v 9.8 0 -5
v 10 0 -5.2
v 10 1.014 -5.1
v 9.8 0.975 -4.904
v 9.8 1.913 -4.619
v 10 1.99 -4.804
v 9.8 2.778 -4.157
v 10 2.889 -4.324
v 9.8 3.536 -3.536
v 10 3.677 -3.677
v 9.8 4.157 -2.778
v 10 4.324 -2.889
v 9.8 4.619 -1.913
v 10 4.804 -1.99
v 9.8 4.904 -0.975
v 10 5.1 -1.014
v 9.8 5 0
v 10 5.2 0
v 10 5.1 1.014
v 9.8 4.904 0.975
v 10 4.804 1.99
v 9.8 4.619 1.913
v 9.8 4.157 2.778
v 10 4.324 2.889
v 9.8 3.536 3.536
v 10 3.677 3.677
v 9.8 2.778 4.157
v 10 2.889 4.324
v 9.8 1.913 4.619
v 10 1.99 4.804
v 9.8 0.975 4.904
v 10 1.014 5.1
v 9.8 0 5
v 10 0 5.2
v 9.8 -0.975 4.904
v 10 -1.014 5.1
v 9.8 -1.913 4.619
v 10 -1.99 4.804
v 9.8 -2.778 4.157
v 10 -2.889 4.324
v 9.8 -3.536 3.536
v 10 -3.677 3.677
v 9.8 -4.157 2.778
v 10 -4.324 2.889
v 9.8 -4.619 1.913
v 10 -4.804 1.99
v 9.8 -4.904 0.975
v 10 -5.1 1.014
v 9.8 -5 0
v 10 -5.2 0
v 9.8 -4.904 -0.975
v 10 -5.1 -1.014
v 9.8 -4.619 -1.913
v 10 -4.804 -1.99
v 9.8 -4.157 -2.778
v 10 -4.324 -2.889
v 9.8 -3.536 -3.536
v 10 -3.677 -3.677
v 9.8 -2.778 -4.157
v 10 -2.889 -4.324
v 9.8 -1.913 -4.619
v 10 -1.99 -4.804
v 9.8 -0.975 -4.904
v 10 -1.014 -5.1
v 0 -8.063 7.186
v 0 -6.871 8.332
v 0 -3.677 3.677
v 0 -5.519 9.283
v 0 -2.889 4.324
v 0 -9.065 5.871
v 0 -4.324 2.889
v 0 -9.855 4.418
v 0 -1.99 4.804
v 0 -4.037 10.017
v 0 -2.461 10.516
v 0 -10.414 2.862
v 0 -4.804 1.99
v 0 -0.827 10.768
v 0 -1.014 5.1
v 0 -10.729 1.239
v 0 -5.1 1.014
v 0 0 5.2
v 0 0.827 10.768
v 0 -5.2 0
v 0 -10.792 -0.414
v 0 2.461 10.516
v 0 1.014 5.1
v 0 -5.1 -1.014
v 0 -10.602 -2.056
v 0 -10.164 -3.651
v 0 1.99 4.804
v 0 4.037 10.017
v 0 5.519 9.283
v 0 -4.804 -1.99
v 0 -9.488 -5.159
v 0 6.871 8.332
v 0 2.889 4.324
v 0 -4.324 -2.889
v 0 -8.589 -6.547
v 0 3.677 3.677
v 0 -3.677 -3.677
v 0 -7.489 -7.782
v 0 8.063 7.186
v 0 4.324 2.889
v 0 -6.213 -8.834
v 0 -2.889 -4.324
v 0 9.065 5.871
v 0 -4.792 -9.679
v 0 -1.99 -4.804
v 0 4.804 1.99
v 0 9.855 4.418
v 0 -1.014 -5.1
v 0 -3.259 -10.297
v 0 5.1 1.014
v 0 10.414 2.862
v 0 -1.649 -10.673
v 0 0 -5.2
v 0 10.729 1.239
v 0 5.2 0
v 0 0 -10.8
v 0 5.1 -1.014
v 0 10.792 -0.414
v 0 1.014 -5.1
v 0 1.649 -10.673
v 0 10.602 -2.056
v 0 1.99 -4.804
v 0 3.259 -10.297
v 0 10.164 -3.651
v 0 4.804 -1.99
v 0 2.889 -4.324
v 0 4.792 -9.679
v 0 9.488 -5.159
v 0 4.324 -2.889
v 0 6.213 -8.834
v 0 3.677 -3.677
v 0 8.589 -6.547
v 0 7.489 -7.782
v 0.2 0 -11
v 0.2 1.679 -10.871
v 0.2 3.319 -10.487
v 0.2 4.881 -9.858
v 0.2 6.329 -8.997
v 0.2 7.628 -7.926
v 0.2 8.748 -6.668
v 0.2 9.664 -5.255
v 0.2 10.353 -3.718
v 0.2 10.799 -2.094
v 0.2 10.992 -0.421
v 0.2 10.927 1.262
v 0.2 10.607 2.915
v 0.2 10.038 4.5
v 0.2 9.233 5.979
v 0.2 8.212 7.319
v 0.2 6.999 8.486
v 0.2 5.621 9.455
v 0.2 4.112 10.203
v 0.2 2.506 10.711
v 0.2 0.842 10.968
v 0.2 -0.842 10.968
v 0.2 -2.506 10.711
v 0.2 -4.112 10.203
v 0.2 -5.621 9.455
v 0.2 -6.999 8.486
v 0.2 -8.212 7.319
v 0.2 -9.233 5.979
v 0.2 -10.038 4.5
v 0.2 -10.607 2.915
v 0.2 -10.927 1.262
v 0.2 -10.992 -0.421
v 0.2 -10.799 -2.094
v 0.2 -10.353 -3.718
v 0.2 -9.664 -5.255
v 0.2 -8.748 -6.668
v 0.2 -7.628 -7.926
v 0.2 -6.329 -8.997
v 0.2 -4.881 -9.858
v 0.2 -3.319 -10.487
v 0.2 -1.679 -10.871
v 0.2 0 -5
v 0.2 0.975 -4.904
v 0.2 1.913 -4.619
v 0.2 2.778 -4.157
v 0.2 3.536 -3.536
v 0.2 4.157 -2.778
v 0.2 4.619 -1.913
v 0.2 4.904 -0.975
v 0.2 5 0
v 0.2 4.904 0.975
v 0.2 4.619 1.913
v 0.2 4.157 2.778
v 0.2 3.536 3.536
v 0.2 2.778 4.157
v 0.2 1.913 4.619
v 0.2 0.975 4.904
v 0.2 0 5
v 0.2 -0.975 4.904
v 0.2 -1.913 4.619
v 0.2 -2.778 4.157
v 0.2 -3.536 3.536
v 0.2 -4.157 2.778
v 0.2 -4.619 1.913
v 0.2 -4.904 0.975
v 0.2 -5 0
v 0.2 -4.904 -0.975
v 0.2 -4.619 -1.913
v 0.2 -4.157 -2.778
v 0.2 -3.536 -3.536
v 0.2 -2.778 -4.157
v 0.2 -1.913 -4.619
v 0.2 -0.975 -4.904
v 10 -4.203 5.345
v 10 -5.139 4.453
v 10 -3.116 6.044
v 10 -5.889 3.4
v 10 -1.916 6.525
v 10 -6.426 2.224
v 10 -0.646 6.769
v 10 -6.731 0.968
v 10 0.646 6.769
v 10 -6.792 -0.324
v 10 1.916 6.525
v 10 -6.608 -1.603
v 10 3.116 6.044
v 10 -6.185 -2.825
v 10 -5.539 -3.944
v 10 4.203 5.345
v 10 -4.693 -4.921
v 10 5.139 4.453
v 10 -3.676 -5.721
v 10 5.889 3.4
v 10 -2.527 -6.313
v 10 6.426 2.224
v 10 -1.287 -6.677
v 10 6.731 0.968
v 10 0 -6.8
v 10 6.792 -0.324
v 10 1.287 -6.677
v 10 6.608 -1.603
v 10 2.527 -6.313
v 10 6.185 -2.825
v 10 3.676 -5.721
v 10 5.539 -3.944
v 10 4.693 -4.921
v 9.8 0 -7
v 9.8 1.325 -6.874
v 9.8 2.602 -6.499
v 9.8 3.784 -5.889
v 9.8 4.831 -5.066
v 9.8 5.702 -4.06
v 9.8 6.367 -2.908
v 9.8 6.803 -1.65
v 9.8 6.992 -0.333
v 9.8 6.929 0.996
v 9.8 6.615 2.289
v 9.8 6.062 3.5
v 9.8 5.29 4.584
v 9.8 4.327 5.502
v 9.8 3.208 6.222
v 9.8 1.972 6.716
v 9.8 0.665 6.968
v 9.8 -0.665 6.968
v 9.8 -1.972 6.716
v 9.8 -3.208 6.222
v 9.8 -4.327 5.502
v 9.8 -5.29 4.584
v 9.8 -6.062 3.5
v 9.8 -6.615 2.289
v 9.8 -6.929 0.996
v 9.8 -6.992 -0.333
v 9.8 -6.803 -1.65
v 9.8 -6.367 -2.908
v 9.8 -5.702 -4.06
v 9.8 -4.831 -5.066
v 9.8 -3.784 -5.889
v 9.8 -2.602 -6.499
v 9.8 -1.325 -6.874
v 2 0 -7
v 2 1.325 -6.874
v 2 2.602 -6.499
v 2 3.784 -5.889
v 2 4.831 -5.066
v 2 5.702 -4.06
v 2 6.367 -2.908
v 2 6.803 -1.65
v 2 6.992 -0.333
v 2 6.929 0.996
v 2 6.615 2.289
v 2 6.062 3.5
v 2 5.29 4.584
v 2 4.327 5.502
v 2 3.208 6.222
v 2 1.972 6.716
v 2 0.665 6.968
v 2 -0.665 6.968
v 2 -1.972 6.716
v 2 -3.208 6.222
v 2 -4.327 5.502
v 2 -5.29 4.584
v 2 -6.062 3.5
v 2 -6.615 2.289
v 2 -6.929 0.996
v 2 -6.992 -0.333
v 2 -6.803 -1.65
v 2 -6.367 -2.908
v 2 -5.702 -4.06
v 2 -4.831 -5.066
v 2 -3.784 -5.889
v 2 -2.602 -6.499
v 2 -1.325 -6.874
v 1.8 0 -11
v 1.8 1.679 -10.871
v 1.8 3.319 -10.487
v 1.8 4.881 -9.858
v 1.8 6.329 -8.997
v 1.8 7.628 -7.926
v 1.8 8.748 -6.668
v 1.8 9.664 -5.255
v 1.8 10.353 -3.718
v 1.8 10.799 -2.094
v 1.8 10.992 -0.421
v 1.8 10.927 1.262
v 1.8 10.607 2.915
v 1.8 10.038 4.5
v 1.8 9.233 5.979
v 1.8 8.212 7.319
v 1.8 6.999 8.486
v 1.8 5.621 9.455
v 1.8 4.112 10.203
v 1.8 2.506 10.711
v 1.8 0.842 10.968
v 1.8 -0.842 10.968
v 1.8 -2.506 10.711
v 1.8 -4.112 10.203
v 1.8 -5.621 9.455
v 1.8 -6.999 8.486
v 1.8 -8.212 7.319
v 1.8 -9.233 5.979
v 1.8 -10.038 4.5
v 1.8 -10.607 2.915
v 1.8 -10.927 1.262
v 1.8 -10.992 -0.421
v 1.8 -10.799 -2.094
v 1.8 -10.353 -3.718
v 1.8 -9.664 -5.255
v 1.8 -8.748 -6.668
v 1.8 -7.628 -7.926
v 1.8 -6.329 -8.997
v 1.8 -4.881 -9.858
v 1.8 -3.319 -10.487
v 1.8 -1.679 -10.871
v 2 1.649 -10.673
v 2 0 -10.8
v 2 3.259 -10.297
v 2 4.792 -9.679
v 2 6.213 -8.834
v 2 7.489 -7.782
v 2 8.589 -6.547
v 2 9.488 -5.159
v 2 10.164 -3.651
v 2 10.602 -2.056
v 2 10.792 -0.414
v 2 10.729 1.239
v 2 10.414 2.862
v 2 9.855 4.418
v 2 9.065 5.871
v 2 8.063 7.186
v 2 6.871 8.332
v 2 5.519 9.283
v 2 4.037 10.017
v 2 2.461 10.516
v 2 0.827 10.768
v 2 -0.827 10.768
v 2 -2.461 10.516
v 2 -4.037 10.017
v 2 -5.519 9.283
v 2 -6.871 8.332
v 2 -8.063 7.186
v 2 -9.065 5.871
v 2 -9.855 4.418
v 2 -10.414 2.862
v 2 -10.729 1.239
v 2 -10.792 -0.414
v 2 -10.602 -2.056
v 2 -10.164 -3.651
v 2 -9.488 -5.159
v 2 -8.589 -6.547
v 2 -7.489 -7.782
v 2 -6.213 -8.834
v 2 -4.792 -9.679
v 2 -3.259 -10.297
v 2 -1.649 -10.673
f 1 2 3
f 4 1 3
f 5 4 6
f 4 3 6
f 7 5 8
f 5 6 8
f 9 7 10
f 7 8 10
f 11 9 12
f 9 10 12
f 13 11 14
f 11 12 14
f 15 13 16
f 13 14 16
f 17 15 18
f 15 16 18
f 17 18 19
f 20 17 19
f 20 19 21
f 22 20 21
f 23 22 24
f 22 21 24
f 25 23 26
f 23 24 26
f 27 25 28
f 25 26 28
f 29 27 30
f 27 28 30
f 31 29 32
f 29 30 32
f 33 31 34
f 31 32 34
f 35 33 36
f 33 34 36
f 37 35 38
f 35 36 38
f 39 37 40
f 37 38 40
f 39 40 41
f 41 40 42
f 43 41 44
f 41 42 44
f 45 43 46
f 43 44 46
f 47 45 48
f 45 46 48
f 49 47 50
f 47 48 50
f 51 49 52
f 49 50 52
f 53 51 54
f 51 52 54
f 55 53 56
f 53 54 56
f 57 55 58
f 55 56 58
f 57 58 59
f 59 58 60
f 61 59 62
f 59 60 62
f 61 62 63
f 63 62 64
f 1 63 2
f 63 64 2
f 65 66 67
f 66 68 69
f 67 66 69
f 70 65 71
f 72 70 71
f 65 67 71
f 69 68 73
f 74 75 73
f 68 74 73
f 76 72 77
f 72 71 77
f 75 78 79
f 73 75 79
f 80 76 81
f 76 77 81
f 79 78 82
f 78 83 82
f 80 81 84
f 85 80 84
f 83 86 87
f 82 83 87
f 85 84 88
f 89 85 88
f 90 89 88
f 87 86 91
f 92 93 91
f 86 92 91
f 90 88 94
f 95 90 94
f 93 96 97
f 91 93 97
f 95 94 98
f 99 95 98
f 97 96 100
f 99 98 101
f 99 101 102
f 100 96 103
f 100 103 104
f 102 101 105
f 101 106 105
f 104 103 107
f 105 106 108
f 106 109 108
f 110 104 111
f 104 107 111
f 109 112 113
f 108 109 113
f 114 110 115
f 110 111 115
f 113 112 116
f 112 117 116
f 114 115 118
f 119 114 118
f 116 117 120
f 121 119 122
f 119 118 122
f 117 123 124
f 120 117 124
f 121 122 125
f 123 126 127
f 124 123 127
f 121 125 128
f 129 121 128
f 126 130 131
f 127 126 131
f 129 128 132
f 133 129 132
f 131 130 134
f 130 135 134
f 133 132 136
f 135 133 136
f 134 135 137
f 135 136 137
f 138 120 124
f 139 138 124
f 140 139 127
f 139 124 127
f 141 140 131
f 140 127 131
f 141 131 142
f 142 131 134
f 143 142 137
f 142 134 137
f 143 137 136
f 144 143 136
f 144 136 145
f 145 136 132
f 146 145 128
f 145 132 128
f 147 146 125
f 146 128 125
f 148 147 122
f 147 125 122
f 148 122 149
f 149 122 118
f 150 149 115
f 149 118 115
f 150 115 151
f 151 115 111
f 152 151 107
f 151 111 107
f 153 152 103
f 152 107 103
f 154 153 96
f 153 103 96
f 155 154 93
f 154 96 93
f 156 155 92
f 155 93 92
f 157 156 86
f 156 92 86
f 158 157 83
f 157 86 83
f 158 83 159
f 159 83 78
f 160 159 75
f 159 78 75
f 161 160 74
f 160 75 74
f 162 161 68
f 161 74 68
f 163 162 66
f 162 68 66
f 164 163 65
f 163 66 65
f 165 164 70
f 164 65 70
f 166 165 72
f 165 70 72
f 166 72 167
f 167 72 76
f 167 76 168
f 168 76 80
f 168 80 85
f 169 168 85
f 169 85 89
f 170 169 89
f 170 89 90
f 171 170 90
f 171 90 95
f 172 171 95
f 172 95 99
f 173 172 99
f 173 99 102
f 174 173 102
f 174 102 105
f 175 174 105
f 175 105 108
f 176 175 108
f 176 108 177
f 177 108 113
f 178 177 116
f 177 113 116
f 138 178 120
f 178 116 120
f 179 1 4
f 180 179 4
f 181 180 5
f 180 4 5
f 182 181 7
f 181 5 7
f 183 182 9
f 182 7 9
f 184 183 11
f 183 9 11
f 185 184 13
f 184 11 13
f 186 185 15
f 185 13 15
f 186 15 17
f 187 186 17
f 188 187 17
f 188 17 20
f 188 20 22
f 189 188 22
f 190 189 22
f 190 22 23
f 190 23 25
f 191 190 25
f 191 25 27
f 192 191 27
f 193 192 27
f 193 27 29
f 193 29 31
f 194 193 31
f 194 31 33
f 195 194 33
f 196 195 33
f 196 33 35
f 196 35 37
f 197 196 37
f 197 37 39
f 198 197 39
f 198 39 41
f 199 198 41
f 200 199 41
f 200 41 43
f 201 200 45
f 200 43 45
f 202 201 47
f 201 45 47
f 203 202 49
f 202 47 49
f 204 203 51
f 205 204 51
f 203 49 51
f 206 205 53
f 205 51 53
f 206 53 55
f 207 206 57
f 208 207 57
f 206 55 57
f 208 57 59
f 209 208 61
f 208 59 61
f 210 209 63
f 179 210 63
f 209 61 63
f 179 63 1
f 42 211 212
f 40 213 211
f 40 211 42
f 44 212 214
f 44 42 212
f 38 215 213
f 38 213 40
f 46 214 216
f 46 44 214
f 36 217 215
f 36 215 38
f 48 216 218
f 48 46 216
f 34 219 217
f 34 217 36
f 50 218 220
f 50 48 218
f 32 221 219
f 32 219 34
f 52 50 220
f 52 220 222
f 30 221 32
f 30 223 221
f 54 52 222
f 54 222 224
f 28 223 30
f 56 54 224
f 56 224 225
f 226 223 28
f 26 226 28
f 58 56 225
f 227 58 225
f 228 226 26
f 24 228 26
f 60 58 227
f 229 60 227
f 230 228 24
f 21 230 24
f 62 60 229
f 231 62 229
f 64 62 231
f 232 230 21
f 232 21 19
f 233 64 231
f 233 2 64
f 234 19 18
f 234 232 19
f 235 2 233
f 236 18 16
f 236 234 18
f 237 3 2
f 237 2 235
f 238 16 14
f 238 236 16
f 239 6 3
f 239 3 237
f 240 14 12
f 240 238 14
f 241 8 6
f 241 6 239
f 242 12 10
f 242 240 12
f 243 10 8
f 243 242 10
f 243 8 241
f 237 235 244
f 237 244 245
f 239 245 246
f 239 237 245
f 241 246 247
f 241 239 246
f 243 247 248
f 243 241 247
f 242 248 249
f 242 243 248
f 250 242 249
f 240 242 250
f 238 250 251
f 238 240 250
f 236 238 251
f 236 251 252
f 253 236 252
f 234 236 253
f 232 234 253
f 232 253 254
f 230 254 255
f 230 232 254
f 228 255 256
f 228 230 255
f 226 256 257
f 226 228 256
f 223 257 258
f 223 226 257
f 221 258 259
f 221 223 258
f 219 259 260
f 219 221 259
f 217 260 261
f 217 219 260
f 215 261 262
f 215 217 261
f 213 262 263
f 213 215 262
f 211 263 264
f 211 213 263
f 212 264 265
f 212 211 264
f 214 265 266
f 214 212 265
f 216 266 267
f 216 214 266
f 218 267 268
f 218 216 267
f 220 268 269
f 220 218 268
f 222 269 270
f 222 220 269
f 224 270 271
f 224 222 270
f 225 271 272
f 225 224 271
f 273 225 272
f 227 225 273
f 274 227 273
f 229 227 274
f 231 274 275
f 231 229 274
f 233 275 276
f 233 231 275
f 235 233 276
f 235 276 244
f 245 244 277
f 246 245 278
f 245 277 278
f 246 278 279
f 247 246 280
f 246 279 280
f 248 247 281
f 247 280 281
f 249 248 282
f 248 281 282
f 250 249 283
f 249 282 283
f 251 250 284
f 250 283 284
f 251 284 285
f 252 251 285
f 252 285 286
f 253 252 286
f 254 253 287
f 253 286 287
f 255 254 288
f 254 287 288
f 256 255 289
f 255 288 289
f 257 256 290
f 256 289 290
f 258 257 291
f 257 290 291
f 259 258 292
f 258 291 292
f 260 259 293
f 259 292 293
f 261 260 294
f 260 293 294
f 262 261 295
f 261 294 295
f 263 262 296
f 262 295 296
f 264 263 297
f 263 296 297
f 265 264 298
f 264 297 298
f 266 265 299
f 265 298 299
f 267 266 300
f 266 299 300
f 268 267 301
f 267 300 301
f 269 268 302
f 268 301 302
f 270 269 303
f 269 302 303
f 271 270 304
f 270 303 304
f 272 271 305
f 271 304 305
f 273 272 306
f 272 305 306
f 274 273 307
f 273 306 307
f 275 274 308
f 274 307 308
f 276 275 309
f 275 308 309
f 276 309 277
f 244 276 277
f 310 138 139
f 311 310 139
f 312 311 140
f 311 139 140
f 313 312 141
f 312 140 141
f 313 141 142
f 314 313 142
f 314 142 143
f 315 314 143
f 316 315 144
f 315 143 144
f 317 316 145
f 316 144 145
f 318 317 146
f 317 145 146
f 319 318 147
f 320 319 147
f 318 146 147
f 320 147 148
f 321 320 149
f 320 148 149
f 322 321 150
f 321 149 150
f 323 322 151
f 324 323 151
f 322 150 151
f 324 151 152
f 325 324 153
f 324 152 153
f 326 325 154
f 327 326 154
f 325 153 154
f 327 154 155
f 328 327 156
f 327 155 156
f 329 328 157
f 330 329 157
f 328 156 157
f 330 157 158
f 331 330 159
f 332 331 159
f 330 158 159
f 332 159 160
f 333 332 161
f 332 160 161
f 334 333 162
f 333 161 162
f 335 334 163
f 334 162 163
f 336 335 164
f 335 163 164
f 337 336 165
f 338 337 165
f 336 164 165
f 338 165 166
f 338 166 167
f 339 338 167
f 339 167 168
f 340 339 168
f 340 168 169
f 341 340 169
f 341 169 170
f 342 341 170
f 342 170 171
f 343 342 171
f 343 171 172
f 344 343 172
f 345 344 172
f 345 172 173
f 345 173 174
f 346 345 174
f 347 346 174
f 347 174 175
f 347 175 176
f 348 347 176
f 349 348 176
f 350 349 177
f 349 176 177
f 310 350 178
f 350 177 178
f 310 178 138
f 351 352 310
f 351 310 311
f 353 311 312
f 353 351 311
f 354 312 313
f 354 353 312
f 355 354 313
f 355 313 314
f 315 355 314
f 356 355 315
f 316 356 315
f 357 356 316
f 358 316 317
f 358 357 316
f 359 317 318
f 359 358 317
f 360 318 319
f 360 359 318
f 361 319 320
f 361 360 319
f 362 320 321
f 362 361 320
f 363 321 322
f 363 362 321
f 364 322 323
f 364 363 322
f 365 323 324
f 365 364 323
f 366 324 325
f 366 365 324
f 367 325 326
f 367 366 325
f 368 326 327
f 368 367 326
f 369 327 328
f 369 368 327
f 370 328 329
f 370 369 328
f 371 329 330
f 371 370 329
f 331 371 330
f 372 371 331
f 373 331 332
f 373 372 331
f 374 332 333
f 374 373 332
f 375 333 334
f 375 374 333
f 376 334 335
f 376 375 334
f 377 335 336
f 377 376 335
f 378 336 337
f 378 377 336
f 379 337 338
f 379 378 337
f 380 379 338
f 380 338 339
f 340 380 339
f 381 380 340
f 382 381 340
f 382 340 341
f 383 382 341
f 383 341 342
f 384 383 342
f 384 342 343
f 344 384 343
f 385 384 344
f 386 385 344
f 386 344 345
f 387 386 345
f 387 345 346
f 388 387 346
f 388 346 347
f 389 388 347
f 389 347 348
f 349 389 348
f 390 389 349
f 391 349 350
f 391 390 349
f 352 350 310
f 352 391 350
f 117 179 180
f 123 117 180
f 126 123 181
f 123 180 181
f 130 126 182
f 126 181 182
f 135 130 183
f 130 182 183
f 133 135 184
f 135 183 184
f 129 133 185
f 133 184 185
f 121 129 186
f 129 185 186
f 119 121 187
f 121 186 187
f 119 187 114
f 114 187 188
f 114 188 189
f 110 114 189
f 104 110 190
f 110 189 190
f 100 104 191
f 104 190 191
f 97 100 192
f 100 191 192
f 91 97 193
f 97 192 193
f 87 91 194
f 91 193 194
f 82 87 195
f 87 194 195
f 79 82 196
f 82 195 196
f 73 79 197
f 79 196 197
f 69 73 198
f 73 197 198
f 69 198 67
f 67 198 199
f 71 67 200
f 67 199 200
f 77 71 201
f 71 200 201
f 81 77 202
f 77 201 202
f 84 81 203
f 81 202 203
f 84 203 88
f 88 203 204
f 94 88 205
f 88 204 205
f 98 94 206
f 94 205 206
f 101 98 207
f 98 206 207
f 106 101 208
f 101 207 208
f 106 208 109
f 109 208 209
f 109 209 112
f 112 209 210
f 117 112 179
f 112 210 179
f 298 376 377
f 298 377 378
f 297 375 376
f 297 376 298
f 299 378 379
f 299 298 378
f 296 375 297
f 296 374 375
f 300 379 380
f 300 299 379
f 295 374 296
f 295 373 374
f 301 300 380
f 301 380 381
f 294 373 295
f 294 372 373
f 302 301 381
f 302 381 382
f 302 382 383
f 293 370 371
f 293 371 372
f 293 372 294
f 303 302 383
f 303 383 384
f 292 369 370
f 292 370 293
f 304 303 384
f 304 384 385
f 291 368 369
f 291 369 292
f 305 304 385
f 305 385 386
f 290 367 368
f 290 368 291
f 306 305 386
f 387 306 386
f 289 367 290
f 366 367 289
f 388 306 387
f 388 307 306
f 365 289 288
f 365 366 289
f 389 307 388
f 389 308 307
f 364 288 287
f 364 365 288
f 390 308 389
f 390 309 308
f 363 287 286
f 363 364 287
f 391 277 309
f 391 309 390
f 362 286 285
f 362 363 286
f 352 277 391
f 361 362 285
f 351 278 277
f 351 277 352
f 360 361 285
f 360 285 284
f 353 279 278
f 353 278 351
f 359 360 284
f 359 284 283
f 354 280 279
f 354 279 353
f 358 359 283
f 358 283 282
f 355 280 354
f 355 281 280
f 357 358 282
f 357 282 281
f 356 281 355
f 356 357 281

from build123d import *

# Parameters (mm, degrees)
SKETCH_1_R          = 11
EXTRUDE_1_DEPTH     = 2
SKETCH_2_R          = 7
EXTRUDE_2_DEPTH     = 8
SKETCH_3_R          = 5
CUT_EXTRUDE_1_DEPTH = 19.493242009
CHAMFER_1_SIZE      = 0.2


with BuildPart() as part:
    # 草图1 → 凸台-拉伸1 (new body)
    with BuildSketch(Plane(origin=(0, 0, 0), x_dir=(0, 0, -1), z_dir=(1, 0, 0))):
        Circle(SKETCH_1_R)
    extrude(amount=EXTRUDE_1_DEPTH)

    # 草图2 → 凸台-拉伸2 (add)
    with BuildSketch(Plane(origin=(2, 0, 0), x_dir=(0, 0, -1), z_dir=(1, 0, 0))):
        Circle(SKETCH_2_R)
    extrude(amount=EXTRUDE_2_DEPTH)

    # 草图3 → 切除-拉伸1 (cut, through all)
    with BuildSketch(Plane(origin=(10, 0, 0), x_dir=(0, 0, -1), z_dir=(1, 0, 0))):
        Circle(SKETCH_3_R)
    extrude(amount=-CUT_EXTRUDE_1_DEPTH, mode=Mode.SUBTRACT)

    # 倒角1
    chamfer_1_edges = [part.edges().sort_by_distance(p)[0] for p in [
        (0, 0, 5),
        (10, 0, 5),
        (0, 0, 11),
        (2, 0, 11),
        (10, 0, 7),
    ]]
    chamfer(chamfer_1_edges, length=CHAMFER_1_SIZE)


solid = part.part
